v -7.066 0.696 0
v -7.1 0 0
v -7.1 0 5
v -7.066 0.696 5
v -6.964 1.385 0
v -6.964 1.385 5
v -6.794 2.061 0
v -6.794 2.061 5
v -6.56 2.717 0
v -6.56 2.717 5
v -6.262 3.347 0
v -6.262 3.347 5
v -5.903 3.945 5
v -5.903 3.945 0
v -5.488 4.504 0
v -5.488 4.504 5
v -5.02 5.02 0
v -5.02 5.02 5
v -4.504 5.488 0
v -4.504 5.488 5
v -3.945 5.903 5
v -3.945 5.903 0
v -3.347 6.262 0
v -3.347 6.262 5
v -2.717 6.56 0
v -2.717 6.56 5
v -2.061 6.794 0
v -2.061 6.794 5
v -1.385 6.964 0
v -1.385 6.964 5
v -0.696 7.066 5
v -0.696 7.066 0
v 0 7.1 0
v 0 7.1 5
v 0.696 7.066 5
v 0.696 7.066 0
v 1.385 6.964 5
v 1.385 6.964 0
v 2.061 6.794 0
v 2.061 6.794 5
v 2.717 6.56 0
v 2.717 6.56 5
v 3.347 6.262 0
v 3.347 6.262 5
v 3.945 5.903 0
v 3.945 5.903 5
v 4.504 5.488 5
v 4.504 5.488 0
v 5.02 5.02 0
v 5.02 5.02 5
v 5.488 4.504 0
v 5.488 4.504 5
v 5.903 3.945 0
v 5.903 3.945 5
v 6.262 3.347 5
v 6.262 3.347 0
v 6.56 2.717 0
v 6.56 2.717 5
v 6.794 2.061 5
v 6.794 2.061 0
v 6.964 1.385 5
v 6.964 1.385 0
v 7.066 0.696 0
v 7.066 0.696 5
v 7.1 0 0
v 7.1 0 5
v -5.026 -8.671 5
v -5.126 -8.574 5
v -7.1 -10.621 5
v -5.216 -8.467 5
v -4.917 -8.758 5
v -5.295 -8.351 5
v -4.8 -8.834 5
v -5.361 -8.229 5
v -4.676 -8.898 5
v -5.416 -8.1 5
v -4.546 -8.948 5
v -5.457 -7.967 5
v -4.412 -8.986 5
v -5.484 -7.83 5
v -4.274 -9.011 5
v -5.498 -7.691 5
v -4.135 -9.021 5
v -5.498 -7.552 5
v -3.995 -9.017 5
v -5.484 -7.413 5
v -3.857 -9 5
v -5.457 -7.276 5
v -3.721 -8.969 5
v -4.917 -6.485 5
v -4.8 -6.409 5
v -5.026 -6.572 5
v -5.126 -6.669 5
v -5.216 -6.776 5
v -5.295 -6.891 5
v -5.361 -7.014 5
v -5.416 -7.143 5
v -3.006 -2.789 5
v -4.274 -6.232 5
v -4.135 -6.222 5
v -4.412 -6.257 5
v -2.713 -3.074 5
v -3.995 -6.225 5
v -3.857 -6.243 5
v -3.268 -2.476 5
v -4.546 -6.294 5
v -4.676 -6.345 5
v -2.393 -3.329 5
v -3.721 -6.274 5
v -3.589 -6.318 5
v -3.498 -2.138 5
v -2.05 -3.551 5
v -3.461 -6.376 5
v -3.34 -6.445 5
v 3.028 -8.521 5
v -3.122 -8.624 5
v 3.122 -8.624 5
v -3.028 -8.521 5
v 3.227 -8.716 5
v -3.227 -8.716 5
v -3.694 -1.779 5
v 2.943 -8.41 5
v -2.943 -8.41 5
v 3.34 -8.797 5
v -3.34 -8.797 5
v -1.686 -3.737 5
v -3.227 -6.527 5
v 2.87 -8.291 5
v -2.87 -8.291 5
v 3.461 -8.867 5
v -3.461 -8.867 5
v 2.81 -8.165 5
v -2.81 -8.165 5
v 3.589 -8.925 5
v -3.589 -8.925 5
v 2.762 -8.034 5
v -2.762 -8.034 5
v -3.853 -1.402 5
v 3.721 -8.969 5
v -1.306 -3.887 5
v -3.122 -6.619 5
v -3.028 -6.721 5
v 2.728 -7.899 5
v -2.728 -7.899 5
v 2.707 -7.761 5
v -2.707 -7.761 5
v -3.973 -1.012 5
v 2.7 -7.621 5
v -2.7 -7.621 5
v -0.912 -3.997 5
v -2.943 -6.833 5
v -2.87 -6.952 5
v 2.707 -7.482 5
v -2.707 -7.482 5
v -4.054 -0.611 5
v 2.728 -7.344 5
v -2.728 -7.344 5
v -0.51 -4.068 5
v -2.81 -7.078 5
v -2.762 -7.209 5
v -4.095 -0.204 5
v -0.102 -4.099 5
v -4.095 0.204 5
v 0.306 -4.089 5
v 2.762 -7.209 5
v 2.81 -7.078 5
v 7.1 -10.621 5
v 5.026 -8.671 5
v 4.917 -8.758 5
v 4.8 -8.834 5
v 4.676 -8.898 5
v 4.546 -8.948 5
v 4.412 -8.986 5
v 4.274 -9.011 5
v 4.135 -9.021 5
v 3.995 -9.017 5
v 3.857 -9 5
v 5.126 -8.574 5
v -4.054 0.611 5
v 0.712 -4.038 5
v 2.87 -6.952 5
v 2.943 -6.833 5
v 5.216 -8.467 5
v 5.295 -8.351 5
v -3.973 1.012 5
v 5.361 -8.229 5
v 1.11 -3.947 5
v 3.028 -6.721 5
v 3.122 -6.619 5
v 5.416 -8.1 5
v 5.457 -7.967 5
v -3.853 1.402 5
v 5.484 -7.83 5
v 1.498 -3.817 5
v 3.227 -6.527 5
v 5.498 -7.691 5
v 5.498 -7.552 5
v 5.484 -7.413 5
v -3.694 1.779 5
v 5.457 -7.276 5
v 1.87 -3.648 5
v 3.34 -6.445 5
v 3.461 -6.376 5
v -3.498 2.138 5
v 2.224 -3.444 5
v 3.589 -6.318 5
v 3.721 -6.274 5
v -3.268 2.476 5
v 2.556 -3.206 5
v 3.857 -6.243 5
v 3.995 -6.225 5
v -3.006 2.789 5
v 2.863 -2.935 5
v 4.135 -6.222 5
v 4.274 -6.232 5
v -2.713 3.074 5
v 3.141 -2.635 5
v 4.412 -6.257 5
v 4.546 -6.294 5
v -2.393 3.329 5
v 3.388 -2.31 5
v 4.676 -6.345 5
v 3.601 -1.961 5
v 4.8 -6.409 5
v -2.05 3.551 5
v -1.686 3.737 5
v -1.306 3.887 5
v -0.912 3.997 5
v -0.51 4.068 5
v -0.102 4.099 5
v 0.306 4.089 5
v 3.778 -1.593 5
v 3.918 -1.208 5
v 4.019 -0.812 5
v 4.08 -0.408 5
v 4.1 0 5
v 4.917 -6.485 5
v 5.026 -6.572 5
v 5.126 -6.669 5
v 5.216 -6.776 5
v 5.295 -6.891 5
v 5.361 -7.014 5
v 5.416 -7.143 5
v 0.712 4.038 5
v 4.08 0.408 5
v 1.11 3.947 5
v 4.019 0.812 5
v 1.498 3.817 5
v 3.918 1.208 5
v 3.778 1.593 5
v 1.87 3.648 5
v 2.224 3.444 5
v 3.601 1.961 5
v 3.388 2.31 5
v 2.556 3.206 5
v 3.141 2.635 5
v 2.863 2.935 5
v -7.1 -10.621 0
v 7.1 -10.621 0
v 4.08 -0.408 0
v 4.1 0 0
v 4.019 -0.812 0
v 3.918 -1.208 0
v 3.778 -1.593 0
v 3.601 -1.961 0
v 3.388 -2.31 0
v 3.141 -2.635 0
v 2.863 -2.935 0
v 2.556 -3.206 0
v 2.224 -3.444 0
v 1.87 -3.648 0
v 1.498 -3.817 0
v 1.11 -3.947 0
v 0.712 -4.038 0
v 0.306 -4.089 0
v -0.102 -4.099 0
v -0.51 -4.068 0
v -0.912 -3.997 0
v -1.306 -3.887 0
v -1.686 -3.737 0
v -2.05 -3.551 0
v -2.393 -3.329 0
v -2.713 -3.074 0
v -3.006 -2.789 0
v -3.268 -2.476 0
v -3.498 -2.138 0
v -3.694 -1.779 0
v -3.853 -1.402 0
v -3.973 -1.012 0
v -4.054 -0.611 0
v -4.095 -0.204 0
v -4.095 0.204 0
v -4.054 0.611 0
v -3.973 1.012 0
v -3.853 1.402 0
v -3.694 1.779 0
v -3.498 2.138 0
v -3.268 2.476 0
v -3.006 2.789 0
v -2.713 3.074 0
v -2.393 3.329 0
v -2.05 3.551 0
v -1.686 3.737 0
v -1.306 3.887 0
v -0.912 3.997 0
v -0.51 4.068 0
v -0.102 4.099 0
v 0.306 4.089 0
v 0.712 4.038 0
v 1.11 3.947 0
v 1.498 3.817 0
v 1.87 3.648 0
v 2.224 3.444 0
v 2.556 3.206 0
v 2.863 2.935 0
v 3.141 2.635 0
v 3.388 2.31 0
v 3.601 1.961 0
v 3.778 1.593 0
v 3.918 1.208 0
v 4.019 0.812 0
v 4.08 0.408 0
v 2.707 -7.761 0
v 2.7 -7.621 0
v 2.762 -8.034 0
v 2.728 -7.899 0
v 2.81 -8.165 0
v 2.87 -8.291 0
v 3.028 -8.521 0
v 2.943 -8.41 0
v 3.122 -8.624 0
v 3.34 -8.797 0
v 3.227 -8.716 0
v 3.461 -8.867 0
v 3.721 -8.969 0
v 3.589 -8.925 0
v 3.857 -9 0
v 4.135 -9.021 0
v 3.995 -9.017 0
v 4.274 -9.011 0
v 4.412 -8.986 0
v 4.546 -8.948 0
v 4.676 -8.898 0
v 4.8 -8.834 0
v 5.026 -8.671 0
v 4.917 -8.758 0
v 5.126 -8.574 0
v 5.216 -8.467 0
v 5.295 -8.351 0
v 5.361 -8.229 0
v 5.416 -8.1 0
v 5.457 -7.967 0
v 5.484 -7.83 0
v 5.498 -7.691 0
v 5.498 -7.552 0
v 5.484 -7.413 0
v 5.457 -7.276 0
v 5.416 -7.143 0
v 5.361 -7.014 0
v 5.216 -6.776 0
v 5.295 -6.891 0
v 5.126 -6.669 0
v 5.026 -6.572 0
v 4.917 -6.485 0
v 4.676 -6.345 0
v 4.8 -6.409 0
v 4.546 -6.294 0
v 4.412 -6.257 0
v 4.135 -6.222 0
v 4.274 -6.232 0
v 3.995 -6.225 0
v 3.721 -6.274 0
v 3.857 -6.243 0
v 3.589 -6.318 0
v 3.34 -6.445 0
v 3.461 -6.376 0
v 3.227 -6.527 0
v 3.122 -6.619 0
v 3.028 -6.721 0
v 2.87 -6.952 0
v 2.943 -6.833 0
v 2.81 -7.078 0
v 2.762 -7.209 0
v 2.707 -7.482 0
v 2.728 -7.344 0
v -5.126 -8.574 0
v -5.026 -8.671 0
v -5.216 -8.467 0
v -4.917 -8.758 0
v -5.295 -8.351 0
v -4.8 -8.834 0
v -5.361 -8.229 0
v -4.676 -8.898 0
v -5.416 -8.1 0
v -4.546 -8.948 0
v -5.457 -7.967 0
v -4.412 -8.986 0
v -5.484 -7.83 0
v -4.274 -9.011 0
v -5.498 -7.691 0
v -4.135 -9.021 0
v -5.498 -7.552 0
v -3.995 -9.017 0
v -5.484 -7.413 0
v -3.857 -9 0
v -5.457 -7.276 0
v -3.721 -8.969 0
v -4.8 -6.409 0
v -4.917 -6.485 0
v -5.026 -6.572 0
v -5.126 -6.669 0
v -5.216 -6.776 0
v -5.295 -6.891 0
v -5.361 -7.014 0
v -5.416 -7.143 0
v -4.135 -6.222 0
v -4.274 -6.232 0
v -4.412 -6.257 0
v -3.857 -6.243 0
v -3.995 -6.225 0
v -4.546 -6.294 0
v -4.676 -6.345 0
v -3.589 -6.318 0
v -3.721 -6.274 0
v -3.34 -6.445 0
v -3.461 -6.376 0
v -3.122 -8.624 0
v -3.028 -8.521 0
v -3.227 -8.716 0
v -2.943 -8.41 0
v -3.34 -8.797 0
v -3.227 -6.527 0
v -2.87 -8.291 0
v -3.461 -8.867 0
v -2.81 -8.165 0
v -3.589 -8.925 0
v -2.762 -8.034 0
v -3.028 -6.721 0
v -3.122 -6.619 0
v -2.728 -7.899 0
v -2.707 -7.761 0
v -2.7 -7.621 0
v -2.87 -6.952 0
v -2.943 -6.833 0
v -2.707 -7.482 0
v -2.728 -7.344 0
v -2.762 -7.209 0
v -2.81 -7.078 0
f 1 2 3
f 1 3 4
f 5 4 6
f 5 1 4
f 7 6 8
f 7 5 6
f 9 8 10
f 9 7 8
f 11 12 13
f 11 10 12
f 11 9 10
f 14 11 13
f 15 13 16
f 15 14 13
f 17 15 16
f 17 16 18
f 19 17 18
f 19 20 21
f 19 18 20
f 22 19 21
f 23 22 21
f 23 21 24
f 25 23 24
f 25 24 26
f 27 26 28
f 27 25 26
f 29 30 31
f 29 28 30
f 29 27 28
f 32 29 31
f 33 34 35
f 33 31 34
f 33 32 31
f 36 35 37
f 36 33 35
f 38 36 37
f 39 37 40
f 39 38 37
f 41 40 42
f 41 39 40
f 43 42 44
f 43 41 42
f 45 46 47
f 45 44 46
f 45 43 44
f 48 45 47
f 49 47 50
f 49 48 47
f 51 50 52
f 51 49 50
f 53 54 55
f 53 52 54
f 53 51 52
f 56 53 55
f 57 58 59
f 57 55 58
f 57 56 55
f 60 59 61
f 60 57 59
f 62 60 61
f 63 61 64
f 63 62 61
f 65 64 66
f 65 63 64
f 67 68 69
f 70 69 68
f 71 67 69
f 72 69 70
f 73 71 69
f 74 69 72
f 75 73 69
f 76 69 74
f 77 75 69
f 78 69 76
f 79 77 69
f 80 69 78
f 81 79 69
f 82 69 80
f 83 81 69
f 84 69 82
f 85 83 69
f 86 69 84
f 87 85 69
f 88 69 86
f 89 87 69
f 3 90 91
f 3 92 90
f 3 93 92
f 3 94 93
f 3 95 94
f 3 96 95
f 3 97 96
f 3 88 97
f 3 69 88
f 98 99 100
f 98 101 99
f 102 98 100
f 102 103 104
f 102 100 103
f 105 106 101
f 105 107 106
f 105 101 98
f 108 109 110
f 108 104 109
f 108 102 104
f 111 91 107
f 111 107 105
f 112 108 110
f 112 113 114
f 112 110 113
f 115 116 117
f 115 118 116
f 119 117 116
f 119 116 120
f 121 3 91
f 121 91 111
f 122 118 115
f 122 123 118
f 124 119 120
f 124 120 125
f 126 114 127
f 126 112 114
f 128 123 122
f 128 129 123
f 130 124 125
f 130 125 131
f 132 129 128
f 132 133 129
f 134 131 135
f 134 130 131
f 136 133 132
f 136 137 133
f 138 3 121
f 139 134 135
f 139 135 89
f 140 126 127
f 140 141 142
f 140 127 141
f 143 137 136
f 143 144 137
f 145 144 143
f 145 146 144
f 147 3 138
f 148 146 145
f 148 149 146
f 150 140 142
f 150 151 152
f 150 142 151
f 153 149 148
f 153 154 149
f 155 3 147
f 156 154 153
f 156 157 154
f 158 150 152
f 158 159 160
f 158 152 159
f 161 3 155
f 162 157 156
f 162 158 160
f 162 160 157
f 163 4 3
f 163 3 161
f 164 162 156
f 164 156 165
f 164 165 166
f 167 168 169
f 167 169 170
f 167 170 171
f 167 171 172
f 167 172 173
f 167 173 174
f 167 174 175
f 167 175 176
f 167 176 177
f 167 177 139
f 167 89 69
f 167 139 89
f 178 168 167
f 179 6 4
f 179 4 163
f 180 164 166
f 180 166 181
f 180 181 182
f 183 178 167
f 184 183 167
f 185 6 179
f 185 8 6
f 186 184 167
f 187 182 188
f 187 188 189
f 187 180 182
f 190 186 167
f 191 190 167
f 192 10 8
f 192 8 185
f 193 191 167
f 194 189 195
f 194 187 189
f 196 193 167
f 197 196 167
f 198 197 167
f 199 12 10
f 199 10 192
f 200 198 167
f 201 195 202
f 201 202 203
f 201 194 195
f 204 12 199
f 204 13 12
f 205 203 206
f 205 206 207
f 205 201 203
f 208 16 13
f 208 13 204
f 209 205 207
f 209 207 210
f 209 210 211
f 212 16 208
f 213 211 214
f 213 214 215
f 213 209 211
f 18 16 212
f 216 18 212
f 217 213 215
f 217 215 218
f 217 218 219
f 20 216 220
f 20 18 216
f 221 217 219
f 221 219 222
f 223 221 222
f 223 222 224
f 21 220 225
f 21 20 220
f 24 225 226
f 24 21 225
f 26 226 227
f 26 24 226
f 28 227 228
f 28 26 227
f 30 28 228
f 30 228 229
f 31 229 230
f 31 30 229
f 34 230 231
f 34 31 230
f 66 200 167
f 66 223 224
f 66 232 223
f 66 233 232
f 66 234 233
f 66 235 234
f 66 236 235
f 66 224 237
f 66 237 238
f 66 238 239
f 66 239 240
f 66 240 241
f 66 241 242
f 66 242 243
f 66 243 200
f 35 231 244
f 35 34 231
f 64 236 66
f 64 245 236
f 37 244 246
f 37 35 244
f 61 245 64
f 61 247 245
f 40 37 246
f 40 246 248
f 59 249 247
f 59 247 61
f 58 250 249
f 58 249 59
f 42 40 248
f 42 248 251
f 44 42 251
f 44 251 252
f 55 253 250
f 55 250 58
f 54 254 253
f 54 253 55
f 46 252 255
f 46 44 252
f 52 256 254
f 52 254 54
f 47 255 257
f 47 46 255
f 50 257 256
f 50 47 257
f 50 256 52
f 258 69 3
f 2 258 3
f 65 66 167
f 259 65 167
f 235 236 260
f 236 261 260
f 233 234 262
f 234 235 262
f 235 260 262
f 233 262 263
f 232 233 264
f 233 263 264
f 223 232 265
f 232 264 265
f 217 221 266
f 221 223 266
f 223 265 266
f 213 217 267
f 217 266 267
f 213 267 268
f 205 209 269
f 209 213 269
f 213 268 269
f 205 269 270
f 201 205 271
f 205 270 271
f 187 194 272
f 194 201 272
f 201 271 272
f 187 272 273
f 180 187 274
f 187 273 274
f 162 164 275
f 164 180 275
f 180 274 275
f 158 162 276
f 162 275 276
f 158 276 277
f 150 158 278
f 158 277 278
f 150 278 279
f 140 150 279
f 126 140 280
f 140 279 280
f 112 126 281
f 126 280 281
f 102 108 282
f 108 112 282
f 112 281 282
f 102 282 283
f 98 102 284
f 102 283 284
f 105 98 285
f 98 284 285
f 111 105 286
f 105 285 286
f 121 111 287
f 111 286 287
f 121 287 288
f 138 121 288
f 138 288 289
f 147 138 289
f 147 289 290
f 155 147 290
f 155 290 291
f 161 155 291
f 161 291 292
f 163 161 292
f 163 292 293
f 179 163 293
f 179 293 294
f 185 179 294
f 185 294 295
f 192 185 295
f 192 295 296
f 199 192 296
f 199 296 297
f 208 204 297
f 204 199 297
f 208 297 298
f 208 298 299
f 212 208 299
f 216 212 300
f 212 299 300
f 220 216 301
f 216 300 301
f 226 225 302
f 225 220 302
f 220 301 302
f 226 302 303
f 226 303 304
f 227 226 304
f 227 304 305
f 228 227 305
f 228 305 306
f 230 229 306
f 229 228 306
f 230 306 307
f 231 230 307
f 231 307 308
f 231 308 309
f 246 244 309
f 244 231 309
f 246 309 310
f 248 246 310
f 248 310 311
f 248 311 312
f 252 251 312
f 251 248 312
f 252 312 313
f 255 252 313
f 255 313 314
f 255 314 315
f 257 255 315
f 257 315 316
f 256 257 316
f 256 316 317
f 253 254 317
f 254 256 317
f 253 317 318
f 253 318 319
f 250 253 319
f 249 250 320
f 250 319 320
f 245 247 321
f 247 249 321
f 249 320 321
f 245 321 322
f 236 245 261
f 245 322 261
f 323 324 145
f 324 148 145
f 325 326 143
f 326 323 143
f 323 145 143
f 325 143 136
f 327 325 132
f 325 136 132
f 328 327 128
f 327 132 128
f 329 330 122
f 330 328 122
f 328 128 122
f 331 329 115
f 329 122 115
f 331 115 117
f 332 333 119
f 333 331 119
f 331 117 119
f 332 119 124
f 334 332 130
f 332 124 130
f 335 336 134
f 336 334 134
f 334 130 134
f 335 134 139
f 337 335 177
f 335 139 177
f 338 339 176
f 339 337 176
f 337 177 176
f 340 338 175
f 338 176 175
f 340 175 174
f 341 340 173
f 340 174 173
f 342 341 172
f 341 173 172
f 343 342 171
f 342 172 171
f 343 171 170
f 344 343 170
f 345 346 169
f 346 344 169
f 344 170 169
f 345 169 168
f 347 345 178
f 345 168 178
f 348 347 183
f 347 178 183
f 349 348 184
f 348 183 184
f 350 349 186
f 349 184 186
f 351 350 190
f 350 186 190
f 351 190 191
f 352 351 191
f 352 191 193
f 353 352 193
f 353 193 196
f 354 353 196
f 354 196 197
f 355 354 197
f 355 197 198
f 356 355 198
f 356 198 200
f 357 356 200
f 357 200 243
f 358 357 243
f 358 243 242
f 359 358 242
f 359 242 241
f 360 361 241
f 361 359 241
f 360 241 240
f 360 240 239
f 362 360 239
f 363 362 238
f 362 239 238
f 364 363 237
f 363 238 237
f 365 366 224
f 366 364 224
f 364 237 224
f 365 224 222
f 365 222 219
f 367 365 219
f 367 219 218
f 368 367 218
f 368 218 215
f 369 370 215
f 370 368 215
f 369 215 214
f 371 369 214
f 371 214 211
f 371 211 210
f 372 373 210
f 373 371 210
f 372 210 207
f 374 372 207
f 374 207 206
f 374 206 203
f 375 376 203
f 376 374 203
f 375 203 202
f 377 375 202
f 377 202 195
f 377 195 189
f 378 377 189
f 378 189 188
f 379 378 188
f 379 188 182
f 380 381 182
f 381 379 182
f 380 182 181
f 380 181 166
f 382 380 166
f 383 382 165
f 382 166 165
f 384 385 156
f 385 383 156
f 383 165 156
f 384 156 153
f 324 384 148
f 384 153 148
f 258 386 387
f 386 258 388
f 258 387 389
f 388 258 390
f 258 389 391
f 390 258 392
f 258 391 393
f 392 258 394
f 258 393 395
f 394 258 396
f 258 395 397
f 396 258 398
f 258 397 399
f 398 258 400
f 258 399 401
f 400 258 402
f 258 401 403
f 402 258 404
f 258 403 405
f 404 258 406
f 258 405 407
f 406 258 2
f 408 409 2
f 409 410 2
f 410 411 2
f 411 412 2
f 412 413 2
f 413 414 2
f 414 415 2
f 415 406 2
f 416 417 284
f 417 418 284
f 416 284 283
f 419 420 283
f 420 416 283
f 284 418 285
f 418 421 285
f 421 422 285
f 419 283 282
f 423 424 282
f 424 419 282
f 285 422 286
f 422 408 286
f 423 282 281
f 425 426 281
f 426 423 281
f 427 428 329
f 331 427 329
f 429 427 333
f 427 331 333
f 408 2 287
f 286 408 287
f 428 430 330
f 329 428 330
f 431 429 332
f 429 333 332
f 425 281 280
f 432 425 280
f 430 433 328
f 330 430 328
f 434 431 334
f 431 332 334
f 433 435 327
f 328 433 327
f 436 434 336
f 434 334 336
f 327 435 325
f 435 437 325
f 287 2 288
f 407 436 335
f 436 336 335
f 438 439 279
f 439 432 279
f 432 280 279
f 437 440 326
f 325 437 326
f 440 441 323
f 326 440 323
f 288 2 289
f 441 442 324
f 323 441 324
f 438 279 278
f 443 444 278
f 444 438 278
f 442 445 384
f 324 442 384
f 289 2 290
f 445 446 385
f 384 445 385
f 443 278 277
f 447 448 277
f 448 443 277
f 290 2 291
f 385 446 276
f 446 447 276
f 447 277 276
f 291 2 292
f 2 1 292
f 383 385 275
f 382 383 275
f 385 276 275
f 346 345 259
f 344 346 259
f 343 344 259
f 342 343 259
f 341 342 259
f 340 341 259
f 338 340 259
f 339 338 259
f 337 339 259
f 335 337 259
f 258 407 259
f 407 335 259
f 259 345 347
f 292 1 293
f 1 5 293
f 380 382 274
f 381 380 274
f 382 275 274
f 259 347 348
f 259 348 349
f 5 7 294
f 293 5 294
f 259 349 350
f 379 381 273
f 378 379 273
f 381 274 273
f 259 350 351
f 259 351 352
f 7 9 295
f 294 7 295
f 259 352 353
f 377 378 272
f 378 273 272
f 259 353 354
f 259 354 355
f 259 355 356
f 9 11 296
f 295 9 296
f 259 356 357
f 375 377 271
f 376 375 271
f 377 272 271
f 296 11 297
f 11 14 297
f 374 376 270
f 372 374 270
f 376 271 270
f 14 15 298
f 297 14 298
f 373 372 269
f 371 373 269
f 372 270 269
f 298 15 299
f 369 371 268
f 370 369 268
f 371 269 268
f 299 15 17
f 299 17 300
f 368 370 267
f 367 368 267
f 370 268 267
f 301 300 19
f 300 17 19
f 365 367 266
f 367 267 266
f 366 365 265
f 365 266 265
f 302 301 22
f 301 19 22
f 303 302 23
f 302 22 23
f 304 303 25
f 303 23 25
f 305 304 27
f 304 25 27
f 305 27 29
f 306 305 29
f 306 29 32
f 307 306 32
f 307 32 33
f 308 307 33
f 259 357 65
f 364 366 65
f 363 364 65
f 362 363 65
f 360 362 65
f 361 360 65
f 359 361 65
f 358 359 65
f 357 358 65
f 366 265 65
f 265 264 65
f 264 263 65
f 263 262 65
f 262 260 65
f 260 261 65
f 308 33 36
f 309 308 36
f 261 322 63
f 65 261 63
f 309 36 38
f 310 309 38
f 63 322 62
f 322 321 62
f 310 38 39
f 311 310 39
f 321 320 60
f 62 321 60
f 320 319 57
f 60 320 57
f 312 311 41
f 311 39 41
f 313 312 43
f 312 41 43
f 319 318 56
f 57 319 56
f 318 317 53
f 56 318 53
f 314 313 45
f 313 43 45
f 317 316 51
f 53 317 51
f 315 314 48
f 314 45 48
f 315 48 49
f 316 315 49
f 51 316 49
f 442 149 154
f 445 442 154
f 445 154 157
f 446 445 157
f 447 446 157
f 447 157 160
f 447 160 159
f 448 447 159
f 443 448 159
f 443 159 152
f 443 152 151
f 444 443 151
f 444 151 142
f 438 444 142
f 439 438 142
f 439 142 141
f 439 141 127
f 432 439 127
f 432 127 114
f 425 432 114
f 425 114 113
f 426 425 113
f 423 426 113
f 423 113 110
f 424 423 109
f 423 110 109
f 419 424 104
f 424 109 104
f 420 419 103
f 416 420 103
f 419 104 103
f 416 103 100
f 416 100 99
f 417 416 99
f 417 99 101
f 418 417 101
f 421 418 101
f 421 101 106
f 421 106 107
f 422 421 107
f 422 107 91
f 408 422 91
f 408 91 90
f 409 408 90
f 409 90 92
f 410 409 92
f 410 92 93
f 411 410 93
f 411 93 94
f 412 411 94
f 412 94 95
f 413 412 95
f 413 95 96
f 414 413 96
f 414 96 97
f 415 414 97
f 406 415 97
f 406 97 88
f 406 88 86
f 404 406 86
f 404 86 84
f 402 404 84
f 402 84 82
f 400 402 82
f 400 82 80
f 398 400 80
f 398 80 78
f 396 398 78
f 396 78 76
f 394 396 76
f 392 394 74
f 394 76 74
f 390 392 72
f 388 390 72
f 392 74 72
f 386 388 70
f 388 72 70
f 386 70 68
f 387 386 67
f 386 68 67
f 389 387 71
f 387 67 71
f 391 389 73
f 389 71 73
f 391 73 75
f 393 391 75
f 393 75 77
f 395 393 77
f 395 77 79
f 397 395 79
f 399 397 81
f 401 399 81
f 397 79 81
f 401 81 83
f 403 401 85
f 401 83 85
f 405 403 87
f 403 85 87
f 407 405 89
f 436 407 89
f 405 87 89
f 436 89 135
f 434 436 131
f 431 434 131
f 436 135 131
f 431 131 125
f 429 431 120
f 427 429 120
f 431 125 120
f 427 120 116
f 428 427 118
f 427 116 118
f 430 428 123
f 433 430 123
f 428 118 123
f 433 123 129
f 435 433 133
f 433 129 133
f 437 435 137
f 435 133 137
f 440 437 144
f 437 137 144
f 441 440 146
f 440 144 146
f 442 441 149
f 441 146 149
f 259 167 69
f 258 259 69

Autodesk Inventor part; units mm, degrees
ref_plane "YZ Plane" through (0, 0, 0) normal (1, 0, 0) x (0, 1, 0)
ref_plane "XZ Plane" through (0, 0, 0) normal (0, 1, 0) x (-1, 0, 0)
sketch "草图1" plane through (0, 0, 0) normal (0, 0, 1) x (1, 0, 0)
  circle A0 centre (0, 0) radius 4.1
  circle A1 centre (0, 0) radius 7.1
  dimension "d0" = 8.2
  dimension "d1" = 3
extrude "拉伸1" add sketch "草图1" along normal blind 5
sketch "草图2" plane through (0, 0, 5) normal (0, 0, 1) x (1, 0, 0)
  point P0 (0, 0)
sketch "草图3" plane through (0, 0, 5) normal (0, 0, 1) x (1, 0, 0)
  circle A0 centre (0, 0) radius 7.1 projected
  line L0 (-7.1, 0) -> (7.1, 0)
  line L1 (7.1, 0) -> (7.1, -10.6214)
  line L2 (7.1, -10.6214) -> (-7.1, -10.6214)
  line L3 (-7.1, -10.6214) -> (-7.1, 0)
  line L4 (-7.9158, -10.621) -> (28.0842, -10.6393) projected
  point P0 (7.1, 0)
extrude "拉伸2" add sketch "草图3" against normal blind 5 contours L1 L2 L3 A0
sketch "草图4" plane through (0, 0, 5) normal (0, 0, 1) x (1, 0, 0)
  circle A0 centre (-4.1, -7.6214) radius 1.4
  line L0 (-7.1, -10.6214) -> (7.1, -10.6214) projected
  line L1 (-7.1, 0) -> (-7.1, -10.6214) projected
  point P0 (0, 0)
  dimension "d6" = 2.8
  dimension "d7" = 3
  dimension "d8" = 3
extrude "拉伸3" cut sketch "草图4" against normal blind 5
ref_plane "工作平面1" through (0, -10.6214, 5) normal (1, 0, 0) x (0, 0, -1)
mirror "镜像1" about plane through (0, -10.6214, 5) normal (1, 0, 0) of "拉伸3"
properties part number "Z轴"
